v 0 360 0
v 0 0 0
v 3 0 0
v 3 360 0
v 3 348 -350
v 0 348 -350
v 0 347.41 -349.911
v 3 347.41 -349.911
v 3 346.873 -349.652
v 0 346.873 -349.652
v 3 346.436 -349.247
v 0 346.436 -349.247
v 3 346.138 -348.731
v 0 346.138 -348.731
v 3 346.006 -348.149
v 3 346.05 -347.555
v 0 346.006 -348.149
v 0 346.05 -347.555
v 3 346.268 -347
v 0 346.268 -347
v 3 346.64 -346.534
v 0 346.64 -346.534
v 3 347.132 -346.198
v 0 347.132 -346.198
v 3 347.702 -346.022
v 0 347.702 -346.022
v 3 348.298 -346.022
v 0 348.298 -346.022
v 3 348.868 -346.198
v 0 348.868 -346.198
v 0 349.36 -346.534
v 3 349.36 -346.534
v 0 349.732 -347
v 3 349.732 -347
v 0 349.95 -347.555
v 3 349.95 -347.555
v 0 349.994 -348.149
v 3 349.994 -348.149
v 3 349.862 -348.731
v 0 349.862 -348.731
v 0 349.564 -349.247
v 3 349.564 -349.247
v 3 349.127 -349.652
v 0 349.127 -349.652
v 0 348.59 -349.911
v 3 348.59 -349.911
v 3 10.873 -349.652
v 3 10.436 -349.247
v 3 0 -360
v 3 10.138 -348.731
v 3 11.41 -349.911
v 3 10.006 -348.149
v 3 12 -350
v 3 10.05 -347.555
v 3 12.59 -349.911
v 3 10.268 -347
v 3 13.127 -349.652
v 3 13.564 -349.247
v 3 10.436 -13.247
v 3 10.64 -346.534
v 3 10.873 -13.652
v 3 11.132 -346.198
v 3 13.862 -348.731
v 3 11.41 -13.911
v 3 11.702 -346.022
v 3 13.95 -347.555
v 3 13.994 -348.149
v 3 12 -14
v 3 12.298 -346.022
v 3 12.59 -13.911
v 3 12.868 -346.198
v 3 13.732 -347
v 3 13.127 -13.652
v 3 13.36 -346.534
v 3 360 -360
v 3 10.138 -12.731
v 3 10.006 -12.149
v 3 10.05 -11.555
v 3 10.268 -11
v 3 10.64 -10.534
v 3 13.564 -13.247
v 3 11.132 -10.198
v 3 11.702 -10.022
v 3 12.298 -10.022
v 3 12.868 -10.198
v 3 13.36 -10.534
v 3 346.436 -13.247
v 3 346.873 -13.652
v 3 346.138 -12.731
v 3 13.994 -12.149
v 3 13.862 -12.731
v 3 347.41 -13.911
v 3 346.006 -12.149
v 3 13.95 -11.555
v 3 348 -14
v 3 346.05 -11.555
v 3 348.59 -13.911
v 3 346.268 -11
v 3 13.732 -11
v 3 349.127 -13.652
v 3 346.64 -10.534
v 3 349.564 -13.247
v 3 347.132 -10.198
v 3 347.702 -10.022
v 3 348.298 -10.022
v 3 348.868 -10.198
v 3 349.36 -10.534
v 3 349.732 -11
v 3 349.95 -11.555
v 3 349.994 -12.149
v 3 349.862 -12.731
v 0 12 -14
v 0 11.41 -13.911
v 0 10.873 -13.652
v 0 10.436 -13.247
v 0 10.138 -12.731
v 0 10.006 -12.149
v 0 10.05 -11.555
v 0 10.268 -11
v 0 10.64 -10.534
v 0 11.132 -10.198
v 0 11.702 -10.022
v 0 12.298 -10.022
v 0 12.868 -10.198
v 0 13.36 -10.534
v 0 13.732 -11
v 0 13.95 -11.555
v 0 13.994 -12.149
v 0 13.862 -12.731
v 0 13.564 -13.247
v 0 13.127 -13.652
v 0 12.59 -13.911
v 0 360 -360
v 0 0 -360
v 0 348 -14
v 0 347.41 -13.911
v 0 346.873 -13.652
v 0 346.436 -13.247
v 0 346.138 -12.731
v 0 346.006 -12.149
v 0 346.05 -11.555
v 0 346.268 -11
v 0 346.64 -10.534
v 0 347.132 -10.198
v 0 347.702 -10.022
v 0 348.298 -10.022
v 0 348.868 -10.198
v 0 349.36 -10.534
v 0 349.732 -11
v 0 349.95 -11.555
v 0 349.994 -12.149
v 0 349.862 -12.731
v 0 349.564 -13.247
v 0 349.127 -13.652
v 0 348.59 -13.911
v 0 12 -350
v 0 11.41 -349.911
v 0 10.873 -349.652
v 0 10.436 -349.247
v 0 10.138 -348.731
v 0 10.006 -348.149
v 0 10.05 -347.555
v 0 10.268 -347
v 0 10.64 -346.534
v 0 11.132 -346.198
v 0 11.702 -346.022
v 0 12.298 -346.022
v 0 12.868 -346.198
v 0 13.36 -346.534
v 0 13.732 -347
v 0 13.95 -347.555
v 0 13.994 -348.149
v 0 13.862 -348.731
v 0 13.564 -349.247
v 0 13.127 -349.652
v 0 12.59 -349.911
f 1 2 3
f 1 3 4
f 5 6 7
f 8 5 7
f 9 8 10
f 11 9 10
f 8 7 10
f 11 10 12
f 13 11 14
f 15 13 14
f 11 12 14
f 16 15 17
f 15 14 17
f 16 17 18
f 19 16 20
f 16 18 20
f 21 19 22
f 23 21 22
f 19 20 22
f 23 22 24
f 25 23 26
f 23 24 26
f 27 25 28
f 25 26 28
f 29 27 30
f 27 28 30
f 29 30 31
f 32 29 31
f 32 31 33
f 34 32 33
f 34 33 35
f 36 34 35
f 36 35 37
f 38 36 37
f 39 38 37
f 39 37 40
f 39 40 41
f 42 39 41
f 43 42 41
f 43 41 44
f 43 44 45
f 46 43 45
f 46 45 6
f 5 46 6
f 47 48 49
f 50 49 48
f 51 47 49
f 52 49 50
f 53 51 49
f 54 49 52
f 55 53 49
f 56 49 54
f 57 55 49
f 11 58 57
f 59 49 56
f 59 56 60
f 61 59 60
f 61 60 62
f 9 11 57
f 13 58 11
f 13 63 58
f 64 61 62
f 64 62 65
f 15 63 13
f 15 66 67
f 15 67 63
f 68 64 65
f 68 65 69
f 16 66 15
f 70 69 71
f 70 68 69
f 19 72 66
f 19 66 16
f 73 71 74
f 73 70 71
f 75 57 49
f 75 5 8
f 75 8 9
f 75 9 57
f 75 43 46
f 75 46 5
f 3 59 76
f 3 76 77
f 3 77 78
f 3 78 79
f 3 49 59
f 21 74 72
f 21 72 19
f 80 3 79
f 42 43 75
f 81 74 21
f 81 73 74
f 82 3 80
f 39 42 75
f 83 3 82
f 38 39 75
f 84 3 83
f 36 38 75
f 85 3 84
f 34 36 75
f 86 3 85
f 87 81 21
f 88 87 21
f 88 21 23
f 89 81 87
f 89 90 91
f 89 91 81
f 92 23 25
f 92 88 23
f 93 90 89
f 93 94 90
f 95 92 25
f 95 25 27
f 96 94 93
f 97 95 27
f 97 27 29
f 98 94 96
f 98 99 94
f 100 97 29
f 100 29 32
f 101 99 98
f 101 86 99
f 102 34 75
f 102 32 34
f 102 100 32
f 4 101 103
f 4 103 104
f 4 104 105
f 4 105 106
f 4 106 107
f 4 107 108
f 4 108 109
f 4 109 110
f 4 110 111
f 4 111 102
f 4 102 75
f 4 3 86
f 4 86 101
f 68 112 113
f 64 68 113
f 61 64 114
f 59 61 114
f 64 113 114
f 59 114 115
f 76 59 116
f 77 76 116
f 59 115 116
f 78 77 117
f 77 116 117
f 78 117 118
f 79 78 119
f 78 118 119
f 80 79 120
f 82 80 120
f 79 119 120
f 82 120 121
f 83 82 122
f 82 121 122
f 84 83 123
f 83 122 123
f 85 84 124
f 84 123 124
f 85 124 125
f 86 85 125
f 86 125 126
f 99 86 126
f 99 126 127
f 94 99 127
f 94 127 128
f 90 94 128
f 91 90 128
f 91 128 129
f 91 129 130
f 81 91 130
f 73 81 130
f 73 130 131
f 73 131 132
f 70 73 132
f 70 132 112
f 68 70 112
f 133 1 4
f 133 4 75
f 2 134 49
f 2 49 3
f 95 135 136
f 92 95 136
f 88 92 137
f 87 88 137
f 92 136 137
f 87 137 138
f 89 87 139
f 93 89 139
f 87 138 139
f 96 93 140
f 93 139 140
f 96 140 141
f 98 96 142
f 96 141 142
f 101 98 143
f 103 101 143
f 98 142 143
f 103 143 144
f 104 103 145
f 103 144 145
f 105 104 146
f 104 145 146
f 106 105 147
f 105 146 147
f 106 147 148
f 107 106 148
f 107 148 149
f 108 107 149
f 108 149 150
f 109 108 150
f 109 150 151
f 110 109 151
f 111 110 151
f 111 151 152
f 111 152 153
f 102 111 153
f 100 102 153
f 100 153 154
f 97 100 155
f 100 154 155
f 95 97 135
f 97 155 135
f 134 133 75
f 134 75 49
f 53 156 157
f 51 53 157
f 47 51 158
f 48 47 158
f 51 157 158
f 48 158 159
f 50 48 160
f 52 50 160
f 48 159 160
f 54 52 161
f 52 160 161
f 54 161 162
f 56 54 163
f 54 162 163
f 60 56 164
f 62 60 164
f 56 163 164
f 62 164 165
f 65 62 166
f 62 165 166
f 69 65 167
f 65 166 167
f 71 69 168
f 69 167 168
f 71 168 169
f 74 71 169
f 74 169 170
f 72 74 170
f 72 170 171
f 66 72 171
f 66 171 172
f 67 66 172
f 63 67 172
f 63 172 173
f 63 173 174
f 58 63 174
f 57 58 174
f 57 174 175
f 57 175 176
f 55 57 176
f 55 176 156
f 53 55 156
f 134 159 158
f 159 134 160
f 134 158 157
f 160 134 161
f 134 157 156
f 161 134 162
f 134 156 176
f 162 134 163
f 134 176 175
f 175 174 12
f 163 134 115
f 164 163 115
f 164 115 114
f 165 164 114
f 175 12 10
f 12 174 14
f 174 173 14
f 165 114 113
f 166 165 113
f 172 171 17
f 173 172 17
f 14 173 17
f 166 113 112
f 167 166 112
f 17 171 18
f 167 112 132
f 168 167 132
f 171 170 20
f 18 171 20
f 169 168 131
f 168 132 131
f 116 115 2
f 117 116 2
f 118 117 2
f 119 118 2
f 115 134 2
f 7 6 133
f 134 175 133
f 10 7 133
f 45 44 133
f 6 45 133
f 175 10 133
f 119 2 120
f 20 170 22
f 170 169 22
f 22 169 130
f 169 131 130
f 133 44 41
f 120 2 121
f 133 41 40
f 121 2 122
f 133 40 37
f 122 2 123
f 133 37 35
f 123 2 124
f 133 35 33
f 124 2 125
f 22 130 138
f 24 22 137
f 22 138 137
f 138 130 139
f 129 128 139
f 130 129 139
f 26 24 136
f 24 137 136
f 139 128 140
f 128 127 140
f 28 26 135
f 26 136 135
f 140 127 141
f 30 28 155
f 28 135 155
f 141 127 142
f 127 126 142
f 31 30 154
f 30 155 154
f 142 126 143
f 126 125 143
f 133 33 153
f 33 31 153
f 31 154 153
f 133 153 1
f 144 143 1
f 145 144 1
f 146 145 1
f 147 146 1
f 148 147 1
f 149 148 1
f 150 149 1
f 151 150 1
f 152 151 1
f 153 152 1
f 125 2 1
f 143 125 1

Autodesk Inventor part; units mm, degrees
ref_plane "YZ Plane" through (0, 0, 0) normal (1, 0, 0) x (0, 1, 0)
ref_plane "XZ Plane" through (0, 0, 0) normal (0, 1, 0) x (-1, 0, 0)
ref_plane "XY Plane" through (0, 0, 0) normal (0, 0, 1) x (1, 0, 0)
sketch "Sketch1" plane through (0, 0, 0) normal (1, 0, 0) x (0, 1, 0)
  line L0 (0, 0) -> (360, 0)
  line L1 (360, 0) -> (360, -360)
  line L2 (360, -360) -> (0, -360)
  line L3 (0, -360) -> (0, 0)
  dimension "d0" = 360
  dimension "d1" = 360
extrude "Extrusion1" add sketch "Sketch1" along normal blind 3
hole "Hole1" at (3, 12, -12) direction (-1, 0, 0) diameter 4 end through all
hole "Hole2" at (3, 12, -348) direction (-1, 0, 0) diameter 4 end through all
hole "Hole3" at (3, 348, -12) direction (-1, 0, 0) diameter 4 end through all
hole "Hole4" at (3, 348, -348) direction (-1, 0, 0) diameter 4 end through all
properties part number "FrameBack" material "Dibond"
